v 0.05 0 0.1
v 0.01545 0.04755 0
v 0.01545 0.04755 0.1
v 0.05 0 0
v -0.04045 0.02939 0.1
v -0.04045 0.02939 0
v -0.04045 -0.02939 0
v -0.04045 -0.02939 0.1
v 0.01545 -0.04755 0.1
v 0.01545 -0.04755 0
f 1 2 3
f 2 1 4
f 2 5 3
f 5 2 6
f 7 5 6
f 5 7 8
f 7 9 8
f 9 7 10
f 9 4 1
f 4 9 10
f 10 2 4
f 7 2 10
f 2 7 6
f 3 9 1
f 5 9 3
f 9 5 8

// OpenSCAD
// tiny cylinder: minimum fragments
cylinder(h = 0.1, r = 0.05);
